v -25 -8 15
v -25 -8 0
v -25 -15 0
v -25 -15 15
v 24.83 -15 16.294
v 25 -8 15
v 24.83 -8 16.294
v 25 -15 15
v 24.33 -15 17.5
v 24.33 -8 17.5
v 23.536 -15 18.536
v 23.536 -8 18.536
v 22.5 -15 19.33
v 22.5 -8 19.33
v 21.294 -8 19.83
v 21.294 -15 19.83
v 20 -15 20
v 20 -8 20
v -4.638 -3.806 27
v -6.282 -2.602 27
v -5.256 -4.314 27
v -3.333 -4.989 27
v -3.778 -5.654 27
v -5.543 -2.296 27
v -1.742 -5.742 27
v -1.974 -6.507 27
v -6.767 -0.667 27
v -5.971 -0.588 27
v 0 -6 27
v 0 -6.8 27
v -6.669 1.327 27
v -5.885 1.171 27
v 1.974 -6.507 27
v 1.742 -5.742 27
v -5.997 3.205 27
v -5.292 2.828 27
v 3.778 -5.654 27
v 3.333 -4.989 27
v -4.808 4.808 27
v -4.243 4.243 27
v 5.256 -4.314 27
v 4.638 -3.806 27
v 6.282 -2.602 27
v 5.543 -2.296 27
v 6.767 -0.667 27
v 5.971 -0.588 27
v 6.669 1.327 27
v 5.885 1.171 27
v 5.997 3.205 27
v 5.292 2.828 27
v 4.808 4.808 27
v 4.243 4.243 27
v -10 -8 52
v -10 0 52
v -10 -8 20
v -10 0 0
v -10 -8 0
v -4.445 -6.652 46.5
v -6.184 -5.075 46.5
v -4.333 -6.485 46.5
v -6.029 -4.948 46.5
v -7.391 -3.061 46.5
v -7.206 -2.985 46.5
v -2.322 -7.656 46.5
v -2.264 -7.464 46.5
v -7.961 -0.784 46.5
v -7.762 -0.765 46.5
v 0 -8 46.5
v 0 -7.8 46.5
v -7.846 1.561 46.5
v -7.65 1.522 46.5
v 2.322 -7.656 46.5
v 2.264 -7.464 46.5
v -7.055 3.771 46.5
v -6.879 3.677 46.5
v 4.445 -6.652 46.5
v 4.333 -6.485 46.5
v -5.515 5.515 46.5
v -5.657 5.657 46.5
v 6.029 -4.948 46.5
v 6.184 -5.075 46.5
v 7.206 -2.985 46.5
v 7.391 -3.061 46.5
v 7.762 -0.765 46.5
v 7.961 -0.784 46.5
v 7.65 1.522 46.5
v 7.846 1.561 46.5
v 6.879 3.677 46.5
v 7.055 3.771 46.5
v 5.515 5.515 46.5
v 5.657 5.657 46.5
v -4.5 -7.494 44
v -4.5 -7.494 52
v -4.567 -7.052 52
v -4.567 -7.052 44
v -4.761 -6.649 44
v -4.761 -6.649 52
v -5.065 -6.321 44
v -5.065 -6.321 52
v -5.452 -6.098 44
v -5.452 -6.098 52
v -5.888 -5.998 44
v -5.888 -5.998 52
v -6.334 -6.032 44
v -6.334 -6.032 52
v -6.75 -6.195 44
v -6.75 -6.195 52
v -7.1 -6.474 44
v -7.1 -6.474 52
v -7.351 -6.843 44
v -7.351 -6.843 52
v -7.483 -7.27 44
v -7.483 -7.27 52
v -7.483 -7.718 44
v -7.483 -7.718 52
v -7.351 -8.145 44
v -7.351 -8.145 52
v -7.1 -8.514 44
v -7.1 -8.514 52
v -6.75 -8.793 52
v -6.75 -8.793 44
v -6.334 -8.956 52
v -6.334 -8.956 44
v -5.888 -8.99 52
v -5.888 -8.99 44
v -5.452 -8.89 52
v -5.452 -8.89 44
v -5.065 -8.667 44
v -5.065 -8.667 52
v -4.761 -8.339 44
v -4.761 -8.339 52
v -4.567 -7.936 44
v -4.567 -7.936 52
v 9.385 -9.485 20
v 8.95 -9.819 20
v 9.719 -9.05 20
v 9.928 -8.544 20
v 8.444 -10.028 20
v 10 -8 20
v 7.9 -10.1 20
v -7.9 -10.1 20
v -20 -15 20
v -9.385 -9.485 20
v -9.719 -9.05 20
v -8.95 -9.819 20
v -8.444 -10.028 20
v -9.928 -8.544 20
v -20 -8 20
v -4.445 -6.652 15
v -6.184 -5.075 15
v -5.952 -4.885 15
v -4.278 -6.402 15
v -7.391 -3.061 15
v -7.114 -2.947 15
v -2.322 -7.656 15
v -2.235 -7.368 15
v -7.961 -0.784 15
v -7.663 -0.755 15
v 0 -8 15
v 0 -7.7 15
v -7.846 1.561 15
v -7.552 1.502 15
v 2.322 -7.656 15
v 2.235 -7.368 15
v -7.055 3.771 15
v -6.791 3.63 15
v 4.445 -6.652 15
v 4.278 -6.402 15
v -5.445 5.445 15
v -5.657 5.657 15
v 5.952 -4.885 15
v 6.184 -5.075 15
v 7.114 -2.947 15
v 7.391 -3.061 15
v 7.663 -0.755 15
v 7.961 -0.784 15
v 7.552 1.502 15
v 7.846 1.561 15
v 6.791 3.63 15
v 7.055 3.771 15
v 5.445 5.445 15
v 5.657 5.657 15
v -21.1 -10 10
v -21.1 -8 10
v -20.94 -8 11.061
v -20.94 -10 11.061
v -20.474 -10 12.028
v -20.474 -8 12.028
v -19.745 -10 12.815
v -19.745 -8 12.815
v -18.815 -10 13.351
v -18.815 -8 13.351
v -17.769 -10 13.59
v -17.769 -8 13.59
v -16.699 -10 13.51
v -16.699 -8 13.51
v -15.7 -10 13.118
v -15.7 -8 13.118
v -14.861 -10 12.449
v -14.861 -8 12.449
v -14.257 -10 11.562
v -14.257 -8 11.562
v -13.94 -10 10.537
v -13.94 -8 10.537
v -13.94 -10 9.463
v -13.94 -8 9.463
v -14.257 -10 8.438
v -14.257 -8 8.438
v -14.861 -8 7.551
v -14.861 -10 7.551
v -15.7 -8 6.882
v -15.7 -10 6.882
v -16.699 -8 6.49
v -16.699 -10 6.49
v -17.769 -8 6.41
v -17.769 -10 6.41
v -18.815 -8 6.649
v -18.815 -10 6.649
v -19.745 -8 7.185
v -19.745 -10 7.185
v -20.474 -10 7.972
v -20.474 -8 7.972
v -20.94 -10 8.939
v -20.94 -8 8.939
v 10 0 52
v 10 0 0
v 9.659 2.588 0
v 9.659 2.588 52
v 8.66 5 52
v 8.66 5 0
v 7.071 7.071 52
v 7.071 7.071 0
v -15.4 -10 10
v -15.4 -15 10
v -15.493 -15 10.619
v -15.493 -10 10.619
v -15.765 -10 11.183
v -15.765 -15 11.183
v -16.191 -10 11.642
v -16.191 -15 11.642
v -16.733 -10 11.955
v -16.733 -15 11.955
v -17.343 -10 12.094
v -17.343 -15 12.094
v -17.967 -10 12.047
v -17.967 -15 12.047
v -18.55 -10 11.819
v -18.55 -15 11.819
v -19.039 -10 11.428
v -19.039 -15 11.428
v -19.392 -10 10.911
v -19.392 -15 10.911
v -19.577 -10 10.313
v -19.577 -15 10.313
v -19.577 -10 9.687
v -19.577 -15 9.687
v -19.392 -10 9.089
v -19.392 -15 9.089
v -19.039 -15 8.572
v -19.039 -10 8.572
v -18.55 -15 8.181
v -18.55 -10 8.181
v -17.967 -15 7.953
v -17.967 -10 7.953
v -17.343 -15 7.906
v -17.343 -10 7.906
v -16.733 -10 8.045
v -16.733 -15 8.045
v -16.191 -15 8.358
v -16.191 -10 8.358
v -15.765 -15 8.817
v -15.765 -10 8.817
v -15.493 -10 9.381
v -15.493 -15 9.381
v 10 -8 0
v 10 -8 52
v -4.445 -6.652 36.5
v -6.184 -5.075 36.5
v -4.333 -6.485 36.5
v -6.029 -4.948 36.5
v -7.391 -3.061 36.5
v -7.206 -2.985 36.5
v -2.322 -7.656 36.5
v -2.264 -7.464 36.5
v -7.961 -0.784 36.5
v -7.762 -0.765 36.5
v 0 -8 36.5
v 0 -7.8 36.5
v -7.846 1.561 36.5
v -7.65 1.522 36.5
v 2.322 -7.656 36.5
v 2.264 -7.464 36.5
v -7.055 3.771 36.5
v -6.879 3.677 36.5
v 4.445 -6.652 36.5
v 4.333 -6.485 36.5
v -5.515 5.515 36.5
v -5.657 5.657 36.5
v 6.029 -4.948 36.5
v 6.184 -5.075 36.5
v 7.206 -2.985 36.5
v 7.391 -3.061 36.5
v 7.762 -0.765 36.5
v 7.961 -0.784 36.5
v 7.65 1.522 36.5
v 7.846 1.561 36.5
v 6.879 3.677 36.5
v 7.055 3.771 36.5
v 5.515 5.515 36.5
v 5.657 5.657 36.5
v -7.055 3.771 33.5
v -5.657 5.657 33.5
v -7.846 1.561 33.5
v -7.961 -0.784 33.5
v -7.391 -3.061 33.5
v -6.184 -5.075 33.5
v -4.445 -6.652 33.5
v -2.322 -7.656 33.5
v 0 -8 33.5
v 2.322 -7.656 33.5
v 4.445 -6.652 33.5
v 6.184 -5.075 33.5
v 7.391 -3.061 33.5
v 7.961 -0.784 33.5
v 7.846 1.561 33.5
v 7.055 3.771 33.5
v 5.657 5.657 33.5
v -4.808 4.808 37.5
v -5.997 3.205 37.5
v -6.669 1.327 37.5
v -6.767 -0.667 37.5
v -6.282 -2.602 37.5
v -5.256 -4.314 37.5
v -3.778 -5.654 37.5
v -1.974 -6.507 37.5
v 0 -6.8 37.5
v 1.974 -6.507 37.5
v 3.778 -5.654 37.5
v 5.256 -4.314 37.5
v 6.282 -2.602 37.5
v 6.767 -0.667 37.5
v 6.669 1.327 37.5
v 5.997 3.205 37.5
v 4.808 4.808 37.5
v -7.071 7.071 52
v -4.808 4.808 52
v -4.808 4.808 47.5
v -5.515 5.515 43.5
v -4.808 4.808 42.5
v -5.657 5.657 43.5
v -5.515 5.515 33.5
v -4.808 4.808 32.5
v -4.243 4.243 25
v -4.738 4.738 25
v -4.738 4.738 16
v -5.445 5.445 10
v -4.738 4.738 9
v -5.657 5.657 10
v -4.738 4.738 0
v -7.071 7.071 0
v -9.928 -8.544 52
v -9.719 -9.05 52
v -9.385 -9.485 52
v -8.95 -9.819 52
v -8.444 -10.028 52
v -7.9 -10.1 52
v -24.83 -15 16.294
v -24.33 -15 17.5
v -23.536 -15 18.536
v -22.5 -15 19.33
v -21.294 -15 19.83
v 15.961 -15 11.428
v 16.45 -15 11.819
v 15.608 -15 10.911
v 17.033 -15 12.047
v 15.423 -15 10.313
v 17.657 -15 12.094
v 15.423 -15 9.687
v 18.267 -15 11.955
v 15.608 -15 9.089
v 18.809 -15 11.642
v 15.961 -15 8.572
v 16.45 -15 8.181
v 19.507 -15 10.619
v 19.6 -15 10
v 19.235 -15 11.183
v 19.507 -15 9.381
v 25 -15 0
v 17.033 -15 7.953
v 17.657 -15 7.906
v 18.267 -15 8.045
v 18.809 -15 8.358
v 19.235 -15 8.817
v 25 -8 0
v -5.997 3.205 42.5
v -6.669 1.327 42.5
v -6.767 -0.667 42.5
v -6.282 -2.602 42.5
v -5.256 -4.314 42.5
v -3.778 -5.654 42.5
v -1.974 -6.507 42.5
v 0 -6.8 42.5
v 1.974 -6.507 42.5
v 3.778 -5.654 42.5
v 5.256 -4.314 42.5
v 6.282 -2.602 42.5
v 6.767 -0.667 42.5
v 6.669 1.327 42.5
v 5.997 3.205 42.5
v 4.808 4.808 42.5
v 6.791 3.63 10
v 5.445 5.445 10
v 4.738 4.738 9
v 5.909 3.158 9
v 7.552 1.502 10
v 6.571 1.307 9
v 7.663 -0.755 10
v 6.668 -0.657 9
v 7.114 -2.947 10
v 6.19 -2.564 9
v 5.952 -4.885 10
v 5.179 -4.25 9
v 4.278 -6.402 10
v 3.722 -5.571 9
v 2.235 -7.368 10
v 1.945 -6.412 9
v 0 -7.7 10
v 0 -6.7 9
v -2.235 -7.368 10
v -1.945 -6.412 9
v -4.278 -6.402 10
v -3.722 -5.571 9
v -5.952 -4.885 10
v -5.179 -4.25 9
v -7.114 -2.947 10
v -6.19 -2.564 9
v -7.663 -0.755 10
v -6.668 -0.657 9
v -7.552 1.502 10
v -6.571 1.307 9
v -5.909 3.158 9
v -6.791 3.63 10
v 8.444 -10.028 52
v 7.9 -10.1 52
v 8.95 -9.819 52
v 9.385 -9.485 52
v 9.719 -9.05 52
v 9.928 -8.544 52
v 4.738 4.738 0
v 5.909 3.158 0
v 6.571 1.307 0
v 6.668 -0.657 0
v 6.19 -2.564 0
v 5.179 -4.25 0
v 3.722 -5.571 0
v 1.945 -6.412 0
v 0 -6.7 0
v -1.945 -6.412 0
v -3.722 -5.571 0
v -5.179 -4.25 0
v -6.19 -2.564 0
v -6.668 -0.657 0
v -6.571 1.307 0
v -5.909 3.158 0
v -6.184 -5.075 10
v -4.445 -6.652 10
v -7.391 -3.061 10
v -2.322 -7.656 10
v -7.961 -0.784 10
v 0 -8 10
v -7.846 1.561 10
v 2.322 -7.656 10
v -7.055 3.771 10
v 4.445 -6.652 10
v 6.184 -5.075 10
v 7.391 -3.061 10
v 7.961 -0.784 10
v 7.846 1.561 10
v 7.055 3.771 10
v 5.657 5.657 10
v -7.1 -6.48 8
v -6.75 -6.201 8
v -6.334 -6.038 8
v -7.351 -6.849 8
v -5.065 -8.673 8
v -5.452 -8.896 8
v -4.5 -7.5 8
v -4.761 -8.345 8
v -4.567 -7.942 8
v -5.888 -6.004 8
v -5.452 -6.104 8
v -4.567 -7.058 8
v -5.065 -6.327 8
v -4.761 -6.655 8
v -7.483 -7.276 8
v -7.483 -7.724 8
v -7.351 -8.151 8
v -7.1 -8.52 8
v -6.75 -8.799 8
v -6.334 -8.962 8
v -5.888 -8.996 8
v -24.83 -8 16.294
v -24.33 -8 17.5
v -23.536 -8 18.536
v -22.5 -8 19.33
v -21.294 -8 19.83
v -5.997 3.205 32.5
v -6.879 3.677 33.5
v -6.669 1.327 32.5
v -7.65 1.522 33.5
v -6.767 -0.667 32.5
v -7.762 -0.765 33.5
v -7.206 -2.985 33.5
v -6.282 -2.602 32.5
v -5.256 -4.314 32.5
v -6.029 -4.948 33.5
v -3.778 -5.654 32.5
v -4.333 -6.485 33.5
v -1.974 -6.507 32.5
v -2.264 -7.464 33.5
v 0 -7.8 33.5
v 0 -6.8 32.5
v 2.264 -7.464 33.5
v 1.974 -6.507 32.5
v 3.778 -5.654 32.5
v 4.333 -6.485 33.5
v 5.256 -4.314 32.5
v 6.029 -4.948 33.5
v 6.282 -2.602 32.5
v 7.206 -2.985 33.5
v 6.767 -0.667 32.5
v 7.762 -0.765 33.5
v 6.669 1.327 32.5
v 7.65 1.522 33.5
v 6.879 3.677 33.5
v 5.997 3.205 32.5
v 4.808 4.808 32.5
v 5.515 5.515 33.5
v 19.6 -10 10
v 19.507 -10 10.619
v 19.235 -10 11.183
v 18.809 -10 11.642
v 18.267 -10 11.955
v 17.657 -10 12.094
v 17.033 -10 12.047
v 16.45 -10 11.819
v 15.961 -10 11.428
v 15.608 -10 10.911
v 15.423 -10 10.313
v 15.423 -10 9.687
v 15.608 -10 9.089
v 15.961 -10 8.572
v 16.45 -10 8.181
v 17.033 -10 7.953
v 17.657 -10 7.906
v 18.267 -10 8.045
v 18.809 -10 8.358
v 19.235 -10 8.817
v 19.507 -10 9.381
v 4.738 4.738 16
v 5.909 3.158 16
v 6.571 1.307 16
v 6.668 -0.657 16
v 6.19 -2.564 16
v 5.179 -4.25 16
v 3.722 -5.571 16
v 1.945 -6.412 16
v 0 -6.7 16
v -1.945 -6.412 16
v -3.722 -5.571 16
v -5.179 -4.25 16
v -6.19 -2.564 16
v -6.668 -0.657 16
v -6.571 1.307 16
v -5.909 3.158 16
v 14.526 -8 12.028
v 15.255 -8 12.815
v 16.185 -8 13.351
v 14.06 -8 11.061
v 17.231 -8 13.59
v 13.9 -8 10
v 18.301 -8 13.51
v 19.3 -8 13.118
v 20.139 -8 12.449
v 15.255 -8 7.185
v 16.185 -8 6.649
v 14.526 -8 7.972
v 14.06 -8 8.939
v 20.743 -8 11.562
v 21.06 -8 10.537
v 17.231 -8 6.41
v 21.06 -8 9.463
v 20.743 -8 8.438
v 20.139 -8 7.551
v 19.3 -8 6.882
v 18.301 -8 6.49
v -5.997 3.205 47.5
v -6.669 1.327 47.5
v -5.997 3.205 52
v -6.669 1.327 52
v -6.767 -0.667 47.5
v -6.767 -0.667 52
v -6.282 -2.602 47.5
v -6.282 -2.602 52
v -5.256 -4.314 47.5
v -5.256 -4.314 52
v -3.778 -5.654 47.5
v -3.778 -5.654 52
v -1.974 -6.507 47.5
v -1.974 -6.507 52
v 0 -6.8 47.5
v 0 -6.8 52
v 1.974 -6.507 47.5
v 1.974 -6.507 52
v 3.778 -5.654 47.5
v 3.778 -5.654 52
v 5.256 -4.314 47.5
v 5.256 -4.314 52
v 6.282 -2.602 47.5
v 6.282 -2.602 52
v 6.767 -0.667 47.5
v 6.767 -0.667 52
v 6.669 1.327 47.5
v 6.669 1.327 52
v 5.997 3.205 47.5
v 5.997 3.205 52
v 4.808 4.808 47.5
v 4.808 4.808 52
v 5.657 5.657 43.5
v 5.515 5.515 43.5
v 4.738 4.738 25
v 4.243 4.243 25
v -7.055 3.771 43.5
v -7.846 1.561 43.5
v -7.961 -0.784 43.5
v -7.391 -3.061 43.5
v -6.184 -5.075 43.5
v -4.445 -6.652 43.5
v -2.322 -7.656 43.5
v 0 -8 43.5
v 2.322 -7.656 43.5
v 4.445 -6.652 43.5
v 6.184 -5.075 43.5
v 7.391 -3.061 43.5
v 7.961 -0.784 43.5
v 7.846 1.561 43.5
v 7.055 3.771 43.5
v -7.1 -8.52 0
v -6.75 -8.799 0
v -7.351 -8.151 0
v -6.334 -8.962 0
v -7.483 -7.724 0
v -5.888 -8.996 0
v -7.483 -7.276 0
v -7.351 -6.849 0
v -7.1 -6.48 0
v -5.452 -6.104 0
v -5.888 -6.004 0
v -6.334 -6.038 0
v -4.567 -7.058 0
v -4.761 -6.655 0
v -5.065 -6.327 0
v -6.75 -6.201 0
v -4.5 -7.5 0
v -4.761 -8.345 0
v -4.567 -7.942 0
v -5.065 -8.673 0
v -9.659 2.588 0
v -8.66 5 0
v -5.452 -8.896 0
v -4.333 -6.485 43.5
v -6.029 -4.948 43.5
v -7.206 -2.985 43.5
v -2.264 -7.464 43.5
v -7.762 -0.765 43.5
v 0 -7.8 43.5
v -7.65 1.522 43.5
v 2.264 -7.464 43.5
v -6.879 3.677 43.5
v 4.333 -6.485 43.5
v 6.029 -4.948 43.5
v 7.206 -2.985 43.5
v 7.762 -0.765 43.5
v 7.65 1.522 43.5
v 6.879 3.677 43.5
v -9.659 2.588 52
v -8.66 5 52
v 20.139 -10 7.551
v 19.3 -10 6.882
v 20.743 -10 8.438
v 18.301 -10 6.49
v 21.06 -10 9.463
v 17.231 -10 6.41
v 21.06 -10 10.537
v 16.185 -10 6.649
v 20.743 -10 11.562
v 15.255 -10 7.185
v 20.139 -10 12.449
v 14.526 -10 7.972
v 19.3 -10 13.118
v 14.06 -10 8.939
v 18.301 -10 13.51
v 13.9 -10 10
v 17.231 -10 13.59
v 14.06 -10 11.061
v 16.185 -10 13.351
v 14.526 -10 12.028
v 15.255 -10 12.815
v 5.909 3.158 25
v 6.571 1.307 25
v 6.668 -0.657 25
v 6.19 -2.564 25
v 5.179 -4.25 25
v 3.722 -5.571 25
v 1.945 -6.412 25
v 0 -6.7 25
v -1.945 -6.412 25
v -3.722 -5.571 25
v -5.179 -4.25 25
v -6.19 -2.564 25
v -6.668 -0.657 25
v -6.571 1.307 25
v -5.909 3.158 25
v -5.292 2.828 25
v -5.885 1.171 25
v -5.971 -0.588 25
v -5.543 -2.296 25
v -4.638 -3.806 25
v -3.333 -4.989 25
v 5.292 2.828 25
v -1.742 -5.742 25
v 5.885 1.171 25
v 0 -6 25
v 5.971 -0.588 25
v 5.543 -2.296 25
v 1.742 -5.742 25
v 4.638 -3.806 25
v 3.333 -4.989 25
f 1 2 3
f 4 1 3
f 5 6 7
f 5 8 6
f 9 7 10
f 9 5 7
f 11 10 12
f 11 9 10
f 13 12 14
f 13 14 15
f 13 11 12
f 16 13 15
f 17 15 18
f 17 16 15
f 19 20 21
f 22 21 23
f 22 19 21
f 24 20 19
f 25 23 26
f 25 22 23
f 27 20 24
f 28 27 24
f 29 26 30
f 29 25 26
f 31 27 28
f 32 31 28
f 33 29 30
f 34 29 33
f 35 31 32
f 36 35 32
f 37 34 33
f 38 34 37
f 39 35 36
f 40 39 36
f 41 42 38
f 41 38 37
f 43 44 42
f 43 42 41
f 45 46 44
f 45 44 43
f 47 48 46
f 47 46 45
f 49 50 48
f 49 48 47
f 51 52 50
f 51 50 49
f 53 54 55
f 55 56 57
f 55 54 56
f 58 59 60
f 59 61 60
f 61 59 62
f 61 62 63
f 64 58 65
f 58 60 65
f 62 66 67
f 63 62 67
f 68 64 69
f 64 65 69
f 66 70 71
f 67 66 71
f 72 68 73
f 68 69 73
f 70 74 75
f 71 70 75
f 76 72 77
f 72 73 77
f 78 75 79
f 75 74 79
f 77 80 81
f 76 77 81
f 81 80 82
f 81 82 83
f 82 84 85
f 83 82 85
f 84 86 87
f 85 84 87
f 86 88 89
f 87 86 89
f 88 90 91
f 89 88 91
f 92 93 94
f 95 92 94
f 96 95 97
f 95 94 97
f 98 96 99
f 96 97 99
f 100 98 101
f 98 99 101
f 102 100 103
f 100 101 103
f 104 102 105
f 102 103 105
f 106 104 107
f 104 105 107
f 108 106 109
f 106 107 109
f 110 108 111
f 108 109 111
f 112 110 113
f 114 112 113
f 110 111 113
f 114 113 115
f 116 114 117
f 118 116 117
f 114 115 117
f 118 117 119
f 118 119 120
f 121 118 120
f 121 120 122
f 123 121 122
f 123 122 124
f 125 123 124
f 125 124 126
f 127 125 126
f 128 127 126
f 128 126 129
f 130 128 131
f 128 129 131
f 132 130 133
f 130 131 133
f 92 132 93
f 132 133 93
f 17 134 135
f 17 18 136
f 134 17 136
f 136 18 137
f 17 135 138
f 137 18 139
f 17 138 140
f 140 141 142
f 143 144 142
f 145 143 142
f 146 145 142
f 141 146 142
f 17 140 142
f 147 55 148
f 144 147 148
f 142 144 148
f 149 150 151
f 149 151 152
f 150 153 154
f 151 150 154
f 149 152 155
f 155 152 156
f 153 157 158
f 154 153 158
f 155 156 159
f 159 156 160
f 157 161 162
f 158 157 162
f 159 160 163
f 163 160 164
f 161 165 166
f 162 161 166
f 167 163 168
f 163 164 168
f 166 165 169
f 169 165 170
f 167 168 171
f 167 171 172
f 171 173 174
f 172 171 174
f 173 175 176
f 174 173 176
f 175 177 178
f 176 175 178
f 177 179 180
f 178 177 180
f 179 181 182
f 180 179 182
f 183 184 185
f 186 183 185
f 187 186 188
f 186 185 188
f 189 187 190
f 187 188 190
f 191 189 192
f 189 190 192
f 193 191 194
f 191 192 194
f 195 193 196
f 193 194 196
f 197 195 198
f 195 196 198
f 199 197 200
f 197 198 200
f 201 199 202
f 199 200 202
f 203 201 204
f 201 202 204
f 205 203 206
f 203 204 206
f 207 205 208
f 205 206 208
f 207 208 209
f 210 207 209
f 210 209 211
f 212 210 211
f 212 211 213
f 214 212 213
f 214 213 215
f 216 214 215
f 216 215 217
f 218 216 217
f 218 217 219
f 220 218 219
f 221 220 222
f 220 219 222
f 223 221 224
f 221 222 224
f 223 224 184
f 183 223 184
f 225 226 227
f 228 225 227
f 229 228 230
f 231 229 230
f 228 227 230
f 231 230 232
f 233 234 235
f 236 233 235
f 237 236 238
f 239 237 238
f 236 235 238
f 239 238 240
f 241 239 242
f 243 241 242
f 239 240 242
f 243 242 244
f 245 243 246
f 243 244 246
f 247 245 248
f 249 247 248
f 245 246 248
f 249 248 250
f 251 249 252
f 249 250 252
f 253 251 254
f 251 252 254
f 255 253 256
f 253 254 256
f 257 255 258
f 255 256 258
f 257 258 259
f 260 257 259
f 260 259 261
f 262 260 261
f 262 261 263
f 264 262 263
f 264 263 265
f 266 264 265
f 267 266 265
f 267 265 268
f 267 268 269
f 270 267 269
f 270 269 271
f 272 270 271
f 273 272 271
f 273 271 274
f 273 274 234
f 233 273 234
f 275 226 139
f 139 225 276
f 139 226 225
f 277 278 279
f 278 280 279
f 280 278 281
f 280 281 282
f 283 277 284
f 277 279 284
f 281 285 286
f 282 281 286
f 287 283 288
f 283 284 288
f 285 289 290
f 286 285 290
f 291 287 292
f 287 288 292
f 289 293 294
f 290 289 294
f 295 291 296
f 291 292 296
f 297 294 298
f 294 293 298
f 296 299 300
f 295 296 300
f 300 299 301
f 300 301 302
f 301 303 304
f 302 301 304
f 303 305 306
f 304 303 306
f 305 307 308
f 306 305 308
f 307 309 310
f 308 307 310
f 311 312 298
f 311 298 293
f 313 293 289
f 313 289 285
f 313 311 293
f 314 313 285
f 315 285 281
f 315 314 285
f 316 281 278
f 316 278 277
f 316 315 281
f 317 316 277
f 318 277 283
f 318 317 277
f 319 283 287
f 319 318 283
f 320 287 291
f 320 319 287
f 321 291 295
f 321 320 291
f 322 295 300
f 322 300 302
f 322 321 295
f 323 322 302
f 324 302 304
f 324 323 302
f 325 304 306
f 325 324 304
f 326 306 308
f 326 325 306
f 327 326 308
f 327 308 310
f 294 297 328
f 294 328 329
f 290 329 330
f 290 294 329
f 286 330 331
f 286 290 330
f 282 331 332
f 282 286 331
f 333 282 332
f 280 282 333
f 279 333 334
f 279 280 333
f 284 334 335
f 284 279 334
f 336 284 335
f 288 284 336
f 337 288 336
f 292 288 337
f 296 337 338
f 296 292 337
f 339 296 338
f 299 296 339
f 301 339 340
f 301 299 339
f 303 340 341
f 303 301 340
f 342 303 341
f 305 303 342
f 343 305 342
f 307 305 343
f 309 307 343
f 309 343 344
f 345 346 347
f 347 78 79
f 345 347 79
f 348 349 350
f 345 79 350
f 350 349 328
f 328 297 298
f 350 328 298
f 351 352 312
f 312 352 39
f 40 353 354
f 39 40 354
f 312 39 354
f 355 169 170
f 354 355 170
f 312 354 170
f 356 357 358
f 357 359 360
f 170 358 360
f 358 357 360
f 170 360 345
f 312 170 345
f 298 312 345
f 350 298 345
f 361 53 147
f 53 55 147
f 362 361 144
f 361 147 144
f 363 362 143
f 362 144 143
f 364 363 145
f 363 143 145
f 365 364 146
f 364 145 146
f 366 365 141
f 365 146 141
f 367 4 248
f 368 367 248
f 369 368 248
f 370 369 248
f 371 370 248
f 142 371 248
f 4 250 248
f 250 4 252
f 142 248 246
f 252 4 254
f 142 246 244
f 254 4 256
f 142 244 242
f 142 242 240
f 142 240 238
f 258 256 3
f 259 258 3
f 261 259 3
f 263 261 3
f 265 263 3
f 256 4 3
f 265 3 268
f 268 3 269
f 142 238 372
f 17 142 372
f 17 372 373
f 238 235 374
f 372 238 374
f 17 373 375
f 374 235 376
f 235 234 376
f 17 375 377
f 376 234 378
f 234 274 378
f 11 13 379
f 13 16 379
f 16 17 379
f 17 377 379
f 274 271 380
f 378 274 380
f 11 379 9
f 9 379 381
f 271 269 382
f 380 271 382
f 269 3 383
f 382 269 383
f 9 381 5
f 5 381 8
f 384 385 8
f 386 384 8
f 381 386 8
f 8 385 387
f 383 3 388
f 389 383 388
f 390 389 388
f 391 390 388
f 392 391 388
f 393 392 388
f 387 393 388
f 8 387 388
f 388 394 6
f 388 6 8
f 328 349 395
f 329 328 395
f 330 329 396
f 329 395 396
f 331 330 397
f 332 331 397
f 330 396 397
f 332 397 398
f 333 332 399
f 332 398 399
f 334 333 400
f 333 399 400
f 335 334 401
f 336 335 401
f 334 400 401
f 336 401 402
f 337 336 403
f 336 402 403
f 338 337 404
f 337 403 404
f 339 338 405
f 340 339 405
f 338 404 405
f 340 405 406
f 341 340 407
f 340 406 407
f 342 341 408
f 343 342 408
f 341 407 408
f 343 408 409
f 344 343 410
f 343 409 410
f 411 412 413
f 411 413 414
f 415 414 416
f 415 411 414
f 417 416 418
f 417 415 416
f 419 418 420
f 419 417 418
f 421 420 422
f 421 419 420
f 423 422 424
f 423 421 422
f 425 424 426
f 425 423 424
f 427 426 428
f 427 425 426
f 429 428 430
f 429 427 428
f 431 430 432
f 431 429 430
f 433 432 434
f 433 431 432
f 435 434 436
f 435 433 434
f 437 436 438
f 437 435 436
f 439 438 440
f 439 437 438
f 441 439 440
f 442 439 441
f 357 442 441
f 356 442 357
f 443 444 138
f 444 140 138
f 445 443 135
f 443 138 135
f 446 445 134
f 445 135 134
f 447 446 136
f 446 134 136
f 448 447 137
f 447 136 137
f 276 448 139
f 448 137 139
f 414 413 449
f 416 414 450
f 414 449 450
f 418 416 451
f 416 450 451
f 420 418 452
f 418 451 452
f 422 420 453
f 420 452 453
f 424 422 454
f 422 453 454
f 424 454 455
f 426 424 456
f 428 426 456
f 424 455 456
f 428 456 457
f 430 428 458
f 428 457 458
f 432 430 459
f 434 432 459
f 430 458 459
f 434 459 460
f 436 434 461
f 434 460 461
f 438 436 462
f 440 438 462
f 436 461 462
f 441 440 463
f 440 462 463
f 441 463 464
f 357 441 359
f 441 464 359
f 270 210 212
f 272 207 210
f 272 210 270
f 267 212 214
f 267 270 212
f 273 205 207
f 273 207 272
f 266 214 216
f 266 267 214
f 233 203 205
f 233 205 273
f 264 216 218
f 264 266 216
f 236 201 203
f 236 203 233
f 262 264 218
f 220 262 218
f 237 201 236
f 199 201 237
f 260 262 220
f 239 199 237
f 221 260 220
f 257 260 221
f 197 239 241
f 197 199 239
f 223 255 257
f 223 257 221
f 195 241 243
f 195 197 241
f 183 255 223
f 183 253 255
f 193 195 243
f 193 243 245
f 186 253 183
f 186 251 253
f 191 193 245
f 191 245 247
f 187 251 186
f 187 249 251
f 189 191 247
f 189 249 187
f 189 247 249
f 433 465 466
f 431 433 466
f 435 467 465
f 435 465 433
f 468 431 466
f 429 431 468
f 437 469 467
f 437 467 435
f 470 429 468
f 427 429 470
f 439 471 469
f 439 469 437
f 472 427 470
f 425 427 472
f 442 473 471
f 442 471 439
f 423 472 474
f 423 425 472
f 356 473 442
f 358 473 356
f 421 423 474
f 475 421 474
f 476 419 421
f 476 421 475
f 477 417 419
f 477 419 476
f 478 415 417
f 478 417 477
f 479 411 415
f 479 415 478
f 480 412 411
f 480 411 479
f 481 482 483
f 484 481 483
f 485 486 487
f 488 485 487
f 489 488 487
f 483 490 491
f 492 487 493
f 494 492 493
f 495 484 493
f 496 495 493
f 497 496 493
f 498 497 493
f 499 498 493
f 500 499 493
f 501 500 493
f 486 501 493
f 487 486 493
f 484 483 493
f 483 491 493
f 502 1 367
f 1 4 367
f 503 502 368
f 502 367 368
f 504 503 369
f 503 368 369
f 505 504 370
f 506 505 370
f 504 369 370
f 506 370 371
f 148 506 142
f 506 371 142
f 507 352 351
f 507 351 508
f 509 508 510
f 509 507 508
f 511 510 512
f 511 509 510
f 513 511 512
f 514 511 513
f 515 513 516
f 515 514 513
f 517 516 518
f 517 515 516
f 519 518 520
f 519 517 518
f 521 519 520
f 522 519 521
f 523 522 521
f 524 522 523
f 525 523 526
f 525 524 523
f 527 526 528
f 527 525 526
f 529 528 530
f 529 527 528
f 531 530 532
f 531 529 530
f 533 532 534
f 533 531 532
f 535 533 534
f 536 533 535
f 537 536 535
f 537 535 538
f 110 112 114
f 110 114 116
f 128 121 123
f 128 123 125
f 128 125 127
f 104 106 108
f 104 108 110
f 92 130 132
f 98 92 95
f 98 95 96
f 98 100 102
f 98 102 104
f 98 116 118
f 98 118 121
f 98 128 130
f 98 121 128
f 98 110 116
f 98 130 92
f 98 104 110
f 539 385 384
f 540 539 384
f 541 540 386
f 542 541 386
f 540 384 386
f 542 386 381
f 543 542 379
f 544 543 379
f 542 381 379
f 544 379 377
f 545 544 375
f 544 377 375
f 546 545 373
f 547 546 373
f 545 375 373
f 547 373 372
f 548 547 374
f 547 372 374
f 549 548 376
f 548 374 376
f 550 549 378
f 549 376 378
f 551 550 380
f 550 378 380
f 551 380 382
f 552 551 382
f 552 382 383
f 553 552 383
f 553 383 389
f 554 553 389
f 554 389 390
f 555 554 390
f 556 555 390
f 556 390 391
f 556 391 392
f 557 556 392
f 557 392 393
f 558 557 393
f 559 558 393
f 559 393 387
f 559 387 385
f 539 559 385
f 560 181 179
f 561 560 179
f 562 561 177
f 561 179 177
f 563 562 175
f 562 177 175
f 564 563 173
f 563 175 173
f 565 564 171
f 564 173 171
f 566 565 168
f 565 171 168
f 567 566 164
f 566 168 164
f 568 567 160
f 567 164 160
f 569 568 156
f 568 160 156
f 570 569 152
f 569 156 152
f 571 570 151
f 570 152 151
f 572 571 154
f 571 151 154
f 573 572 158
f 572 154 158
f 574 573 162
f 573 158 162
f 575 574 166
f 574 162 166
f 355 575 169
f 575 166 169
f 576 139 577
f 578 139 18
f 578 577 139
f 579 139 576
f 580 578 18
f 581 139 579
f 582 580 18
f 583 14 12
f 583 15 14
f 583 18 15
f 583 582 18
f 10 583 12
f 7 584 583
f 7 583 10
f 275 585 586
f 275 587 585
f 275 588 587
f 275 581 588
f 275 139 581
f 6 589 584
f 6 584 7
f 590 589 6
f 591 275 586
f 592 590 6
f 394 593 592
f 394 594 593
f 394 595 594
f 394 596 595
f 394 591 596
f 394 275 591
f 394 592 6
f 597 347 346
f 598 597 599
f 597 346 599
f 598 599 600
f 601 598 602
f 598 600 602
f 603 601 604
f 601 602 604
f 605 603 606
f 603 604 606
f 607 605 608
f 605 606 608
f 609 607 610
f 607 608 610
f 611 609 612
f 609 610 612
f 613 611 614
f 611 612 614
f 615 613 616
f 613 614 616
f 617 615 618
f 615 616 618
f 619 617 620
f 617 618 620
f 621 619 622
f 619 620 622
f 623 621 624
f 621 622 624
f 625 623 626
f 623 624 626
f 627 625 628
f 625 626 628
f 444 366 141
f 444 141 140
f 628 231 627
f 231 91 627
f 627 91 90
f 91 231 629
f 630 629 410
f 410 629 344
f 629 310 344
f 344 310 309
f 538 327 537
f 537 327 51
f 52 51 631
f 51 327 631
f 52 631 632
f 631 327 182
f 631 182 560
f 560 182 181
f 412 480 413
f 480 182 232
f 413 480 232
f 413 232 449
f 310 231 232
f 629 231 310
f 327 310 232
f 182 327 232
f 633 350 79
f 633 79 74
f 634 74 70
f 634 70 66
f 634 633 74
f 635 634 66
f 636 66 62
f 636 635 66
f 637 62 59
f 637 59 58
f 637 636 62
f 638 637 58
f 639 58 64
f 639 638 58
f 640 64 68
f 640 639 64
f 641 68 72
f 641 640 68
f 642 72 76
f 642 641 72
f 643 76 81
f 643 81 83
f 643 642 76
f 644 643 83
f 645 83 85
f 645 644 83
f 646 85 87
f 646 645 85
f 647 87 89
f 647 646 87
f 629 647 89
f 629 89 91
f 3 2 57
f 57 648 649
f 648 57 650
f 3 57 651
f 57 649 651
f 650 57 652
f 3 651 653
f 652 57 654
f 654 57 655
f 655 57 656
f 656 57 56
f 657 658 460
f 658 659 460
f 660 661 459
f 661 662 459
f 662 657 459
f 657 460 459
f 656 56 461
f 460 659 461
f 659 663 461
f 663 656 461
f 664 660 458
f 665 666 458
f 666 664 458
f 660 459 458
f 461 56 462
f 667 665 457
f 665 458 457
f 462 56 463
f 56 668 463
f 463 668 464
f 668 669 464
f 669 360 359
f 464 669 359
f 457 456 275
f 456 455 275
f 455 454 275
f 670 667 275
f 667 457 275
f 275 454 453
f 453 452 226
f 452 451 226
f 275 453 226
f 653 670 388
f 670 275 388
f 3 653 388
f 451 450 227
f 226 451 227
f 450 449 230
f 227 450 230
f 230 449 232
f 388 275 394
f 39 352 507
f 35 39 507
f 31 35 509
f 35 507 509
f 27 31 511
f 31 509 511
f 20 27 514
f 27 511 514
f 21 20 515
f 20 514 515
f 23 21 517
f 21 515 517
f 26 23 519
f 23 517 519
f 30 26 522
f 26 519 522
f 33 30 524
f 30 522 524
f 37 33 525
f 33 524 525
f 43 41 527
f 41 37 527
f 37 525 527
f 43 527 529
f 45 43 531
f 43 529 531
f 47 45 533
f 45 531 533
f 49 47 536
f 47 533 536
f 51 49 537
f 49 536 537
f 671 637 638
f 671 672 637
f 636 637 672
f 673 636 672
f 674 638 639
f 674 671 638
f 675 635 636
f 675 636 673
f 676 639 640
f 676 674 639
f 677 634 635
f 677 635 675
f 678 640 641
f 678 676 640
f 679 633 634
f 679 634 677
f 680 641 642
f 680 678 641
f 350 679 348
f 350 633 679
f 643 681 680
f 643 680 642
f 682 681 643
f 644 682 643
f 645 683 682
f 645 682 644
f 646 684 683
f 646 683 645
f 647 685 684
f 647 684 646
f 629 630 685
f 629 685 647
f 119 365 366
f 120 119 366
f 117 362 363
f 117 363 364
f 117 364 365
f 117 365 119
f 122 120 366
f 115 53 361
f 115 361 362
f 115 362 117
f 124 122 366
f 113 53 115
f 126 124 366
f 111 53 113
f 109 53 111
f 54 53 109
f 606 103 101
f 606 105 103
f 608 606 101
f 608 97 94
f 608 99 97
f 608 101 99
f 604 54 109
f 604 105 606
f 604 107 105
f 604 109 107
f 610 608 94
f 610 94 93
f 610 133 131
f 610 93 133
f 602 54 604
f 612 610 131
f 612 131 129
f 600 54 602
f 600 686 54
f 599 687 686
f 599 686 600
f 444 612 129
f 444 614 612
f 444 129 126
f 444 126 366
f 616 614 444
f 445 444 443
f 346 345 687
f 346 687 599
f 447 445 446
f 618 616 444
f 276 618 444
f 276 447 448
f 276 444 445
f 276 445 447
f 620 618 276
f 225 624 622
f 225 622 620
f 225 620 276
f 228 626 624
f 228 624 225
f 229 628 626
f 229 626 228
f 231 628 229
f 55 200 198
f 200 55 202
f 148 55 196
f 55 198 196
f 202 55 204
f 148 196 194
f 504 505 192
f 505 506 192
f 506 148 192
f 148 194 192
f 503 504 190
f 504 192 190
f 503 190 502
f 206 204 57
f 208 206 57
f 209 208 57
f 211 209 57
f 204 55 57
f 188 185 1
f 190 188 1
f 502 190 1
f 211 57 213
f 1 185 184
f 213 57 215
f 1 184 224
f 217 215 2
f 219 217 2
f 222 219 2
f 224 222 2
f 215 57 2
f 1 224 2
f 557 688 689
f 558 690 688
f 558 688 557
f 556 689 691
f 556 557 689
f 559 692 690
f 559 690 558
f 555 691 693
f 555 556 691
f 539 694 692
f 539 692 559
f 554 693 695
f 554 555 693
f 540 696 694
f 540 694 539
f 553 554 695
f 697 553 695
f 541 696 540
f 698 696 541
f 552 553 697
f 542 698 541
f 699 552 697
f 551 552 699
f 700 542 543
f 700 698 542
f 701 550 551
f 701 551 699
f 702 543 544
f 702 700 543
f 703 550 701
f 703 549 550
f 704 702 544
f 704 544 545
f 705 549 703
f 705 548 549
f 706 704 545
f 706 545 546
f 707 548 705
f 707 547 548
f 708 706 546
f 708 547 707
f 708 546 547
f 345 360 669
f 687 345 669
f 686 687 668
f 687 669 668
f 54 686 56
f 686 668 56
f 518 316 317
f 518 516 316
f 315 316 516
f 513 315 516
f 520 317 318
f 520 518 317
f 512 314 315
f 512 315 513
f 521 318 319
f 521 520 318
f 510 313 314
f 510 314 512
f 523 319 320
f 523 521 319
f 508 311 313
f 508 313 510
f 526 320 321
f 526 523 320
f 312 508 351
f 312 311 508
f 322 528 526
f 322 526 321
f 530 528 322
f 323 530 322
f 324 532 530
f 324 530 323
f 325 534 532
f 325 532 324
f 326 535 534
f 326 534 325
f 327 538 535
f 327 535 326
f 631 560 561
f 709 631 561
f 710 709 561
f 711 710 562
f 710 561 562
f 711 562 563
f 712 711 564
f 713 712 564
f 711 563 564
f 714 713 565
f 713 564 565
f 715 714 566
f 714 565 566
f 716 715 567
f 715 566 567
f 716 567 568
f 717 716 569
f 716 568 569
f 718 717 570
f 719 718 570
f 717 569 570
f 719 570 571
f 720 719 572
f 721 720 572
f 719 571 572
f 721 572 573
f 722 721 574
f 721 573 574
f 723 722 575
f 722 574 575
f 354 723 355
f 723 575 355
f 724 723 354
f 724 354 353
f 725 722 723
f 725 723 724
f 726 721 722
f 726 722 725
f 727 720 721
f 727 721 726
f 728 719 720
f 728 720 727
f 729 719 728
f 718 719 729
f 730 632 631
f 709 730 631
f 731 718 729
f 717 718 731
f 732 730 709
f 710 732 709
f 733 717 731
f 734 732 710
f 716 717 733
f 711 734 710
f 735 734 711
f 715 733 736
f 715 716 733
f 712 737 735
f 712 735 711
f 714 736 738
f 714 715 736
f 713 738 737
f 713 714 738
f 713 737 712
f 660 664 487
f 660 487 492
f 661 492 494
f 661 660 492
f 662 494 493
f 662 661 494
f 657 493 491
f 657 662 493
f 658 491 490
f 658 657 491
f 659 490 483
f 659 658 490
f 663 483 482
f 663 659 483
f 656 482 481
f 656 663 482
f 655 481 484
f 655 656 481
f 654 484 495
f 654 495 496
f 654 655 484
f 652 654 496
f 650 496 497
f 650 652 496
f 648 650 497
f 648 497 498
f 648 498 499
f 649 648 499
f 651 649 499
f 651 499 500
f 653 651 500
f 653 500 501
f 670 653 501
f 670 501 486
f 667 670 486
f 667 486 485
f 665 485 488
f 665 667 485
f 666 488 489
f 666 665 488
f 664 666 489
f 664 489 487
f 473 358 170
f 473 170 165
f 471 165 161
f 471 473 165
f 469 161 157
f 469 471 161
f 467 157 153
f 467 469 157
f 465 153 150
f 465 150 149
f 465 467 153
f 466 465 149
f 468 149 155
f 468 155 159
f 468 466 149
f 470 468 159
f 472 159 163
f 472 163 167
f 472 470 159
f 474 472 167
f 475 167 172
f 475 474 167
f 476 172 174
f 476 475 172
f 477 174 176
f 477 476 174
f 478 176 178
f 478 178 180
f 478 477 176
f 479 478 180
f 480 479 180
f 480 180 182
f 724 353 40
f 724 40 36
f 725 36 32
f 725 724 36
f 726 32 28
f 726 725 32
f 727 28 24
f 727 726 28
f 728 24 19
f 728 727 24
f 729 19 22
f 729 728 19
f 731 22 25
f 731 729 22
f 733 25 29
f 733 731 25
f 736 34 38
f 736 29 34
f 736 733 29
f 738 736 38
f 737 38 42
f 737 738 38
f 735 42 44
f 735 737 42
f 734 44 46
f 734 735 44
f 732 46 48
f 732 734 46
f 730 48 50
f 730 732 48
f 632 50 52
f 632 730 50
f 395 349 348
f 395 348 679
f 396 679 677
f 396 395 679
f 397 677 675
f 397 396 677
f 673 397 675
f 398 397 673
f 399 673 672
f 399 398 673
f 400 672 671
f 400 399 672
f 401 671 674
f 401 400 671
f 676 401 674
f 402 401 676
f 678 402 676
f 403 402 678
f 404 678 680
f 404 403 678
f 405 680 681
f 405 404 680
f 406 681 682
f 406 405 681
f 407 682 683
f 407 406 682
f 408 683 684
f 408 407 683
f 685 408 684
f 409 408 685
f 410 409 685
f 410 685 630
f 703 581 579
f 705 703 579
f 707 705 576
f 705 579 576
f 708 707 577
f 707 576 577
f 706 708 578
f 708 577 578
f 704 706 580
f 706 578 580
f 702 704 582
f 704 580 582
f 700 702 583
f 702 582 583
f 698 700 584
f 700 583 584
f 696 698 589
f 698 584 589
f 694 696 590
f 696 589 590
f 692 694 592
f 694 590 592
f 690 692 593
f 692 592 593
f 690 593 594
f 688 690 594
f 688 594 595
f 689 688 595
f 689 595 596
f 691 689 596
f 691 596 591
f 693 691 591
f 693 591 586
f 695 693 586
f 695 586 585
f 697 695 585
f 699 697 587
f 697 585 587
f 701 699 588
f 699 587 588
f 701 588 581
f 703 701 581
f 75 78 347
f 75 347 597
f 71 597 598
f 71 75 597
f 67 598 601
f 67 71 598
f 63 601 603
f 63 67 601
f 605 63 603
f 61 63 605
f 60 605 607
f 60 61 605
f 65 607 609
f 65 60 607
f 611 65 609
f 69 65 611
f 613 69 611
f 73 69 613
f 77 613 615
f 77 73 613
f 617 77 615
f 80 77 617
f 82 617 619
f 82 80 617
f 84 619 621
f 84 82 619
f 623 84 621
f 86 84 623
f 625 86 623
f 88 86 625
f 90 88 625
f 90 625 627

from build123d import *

# Parameters (mm, degrees)
CYLINDER003_R     = 1.5
CYLINDER003_DEPTH = 8
CYLINDER002_R     = 8
CYLINDER002_DEPTH = 3
CYLINDER001_R     = 8
CYLINDER001_DEPTH = 3
CYLINDER_R        = 8
CYLINDER_DEPTH    = 5
PAD_DEPTH         = 52
SKETCH005_R       = 6.8
POCKET_DEPTH      = 25
SKETCH006_R       = 6.7
POCKET001_DEPTH   = 25
PAD002_DEPTH      = 32
SKETCH010_R       = 1.5
POCKET004_DEPTH   = 8
PAD001_DEPTH      = 20
SKETCH008_R       = 2.1
POCKET002_DEPTH   = 7
SKETCH009_R       = 3.6
POCKET003_DEPTH   = 2
FILLET_R          = 5
FILLET001_R       = 2.1
CHAMFER_SIZE      = 1


with BuildPart() as zylinder003:
    # Cylinder003 → Cylinder003 (new body)
    with BuildSketch(Plane(origin=(-6, -7.5, 0), x_dir=(1, 0, 0), z_dir=(0, 0, 1))):
        Circle(CYLINDER003_R)
    extrude(amount=CYLINDER003_DEPTH)


with BuildPart() as zylinder002:
    # Cylinder002 → Cylinder002 (new body)
    with BuildSketch(Plane.XY.offset(43.5)):
        Circle(CYLINDER002_R)
    extrude(amount=CYLINDER002_DEPTH)


with BuildPart() as zylinder001:
    # Cylinder001 → Cylinder001 (new body)
    with BuildSketch(Plane.XY.offset(33.5)):
        Circle(CYLINDER001_R)
    extrude(amount=CYLINDER001_DEPTH)


with BuildPart() as zylinder:
    # Cylinder → Cylinder (new body)
    with BuildSketch(Plane.XY.offset(10)):
        Circle(CYLINDER_R)
    extrude(amount=CYLINDER_DEPTH)


with BuildPart() as pocket004:
    # Sketch → Pad (new body)
    with BuildSketch(Plane.XY):
        with BuildLine():
            ThreePointArc((-7.071068, 7.071068), (0, -10), (7.071068, 7.071068))
            Line((7.071068, 7.071068), (4.242641, 4.242641))
            ThreePointArc((-4.242641, 4.242641), (0, -6), (4.242641, 4.242641))
            Line((-4.242641, 4.242641), (-7.071068, 7.071068))
        make_face()
    extrude(amount=PAD_DEPTH)

    # Sketch005 → Pocket (cut)
    with BuildSketch(Plane.XY.offset(52)):
        Circle(SKETCH005_R)
    extrude(amount=-POCKET_DEPTH, mode=Mode.SUBTRACT)

    # Sketch006 → Pocket001 (cut)
    with BuildSketch(Plane(origin=(0, 0, 0), x_dir=(1, 0, 0), z_dir=(0, 0, -1))):
        Circle(SKETCH006_R)
    extrude(amount=-POCKET001_DEPTH, mode=Mode.SUBTRACT)

    # Sketch007 → Pad002 (new body)
    with BuildSketch(Plane.XY.offset(52)):
        with BuildLine():
            ThreePointArc((-10, 0), (0, -10), (10, 0))
            Line((10, 0), (10, -10.1))
            Line((-10, -10.1), (10, -10.1))
            Line((-10, 0), (-10, -10.1))
        make_face()
    extrude(amount=-PAD002_DEPTH)

    # Cut: cut Zylinder
    add(zylinder.part, mode=Mode.SUBTRACT)

    # Cut001: cut Zylinder001
    add(zylinder001.part, mode=Mode.SUBTRACT)

    # Cut002: cut Zylinder002
    add(zylinder002.part, mode=Mode.SUBTRACT)

    # Sketch010 → Pocket004 (cut)
    with BuildSketch(Plane.XY.offset(52)):
        with Locations((-6, -7.493998)):
            Circle(SKETCH010_R)
    extrude(amount=-POCKET004_DEPTH, mode=Mode.SUBTRACT)


with BuildPart() as chamfer_body:
    # Sketch003 → Pad001 (new body)
    with BuildSketch(Plane.XY):
        with BuildLine():
            ThreePointArc((-10, 0), (0, -10), (10, 0))
            Line((10, 0), (10, -8))
            Line((10, -8), (25, -8))
            Line((25, -8), (25, -15))
            Line((-25, -15), (25, -15))
            Line((-25, -8), (-25, -15))
            Line((-10, -8), (-25, -8))
            Line((-10, 0), (-10, -8))
        make_face()
    extrude(amount=PAD001_DEPTH)

    # Sketch008 → Pocket002 (cut)
    with BuildSketch(Plane.XZ.offset(15)):
        with Locations((-17.5, 10)):
            Circle(SKETCH008_R)
        with Locations((17.5, 10)):
            Circle(SKETCH008_R)
    extrude(amount=-POCKET002_DEPTH, mode=Mode.SUBTRACT)

    # Sketch009 → Pocket003 (cut)
    with BuildSketch(Plane(origin=(0, -8, 0), x_dir=(-1, 0, 0), z_dir=(0, 1, 0))):
        with Locations((-17.5, 10)):
            Circle(SKETCH009_R)
        with Locations((17.5, 10)):
            Circle(SKETCH009_R)
    extrude(amount=-POCKET003_DEPTH, mode=Mode.SUBTRACT)

    # Fusion: union Pocket004
    add(pocket004.part)

    # Cut003: cut Zylinder003
    add(zylinder003.part, mode=Mode.SUBTRACT)

    # Fillet
    fillet_edges = [chamfer_body.edges().sort_by_distance(p)[0] for p in [
        (-25, -11.5, 20),
        (25, -11.5, 20),
    ]]
    fillet(fillet_edges, radius=FILLET_R)

    # Fillet001
    fillet001_edges = [chamfer_body.edges().sort_by_distance(p)[0] for p in [
        (10, -10.1, 36),
        (-10, -10.1, 36),
    ]]
    fillet(fillet001_edges, radius=FILLET001_R)

    # Chamfer
    chamfer_edges = [chamfer_body.edges().sort_by_distance(p)[0] for p in [
        (-2.563979, -6.189993, 15),
        (-2.563979, -6.189993, 10),
        (-2.602247, -6.282381, 33.5),
        (-2.602247, -6.282381, 36.5),
        (-2.602247, -6.282381, 43.5),
        (-2.602247, -6.282381, 46.5),
    ]]
    chamfer(chamfer_edges, length=CHAMFER_SIZE)


solid = chamfer_body.part
